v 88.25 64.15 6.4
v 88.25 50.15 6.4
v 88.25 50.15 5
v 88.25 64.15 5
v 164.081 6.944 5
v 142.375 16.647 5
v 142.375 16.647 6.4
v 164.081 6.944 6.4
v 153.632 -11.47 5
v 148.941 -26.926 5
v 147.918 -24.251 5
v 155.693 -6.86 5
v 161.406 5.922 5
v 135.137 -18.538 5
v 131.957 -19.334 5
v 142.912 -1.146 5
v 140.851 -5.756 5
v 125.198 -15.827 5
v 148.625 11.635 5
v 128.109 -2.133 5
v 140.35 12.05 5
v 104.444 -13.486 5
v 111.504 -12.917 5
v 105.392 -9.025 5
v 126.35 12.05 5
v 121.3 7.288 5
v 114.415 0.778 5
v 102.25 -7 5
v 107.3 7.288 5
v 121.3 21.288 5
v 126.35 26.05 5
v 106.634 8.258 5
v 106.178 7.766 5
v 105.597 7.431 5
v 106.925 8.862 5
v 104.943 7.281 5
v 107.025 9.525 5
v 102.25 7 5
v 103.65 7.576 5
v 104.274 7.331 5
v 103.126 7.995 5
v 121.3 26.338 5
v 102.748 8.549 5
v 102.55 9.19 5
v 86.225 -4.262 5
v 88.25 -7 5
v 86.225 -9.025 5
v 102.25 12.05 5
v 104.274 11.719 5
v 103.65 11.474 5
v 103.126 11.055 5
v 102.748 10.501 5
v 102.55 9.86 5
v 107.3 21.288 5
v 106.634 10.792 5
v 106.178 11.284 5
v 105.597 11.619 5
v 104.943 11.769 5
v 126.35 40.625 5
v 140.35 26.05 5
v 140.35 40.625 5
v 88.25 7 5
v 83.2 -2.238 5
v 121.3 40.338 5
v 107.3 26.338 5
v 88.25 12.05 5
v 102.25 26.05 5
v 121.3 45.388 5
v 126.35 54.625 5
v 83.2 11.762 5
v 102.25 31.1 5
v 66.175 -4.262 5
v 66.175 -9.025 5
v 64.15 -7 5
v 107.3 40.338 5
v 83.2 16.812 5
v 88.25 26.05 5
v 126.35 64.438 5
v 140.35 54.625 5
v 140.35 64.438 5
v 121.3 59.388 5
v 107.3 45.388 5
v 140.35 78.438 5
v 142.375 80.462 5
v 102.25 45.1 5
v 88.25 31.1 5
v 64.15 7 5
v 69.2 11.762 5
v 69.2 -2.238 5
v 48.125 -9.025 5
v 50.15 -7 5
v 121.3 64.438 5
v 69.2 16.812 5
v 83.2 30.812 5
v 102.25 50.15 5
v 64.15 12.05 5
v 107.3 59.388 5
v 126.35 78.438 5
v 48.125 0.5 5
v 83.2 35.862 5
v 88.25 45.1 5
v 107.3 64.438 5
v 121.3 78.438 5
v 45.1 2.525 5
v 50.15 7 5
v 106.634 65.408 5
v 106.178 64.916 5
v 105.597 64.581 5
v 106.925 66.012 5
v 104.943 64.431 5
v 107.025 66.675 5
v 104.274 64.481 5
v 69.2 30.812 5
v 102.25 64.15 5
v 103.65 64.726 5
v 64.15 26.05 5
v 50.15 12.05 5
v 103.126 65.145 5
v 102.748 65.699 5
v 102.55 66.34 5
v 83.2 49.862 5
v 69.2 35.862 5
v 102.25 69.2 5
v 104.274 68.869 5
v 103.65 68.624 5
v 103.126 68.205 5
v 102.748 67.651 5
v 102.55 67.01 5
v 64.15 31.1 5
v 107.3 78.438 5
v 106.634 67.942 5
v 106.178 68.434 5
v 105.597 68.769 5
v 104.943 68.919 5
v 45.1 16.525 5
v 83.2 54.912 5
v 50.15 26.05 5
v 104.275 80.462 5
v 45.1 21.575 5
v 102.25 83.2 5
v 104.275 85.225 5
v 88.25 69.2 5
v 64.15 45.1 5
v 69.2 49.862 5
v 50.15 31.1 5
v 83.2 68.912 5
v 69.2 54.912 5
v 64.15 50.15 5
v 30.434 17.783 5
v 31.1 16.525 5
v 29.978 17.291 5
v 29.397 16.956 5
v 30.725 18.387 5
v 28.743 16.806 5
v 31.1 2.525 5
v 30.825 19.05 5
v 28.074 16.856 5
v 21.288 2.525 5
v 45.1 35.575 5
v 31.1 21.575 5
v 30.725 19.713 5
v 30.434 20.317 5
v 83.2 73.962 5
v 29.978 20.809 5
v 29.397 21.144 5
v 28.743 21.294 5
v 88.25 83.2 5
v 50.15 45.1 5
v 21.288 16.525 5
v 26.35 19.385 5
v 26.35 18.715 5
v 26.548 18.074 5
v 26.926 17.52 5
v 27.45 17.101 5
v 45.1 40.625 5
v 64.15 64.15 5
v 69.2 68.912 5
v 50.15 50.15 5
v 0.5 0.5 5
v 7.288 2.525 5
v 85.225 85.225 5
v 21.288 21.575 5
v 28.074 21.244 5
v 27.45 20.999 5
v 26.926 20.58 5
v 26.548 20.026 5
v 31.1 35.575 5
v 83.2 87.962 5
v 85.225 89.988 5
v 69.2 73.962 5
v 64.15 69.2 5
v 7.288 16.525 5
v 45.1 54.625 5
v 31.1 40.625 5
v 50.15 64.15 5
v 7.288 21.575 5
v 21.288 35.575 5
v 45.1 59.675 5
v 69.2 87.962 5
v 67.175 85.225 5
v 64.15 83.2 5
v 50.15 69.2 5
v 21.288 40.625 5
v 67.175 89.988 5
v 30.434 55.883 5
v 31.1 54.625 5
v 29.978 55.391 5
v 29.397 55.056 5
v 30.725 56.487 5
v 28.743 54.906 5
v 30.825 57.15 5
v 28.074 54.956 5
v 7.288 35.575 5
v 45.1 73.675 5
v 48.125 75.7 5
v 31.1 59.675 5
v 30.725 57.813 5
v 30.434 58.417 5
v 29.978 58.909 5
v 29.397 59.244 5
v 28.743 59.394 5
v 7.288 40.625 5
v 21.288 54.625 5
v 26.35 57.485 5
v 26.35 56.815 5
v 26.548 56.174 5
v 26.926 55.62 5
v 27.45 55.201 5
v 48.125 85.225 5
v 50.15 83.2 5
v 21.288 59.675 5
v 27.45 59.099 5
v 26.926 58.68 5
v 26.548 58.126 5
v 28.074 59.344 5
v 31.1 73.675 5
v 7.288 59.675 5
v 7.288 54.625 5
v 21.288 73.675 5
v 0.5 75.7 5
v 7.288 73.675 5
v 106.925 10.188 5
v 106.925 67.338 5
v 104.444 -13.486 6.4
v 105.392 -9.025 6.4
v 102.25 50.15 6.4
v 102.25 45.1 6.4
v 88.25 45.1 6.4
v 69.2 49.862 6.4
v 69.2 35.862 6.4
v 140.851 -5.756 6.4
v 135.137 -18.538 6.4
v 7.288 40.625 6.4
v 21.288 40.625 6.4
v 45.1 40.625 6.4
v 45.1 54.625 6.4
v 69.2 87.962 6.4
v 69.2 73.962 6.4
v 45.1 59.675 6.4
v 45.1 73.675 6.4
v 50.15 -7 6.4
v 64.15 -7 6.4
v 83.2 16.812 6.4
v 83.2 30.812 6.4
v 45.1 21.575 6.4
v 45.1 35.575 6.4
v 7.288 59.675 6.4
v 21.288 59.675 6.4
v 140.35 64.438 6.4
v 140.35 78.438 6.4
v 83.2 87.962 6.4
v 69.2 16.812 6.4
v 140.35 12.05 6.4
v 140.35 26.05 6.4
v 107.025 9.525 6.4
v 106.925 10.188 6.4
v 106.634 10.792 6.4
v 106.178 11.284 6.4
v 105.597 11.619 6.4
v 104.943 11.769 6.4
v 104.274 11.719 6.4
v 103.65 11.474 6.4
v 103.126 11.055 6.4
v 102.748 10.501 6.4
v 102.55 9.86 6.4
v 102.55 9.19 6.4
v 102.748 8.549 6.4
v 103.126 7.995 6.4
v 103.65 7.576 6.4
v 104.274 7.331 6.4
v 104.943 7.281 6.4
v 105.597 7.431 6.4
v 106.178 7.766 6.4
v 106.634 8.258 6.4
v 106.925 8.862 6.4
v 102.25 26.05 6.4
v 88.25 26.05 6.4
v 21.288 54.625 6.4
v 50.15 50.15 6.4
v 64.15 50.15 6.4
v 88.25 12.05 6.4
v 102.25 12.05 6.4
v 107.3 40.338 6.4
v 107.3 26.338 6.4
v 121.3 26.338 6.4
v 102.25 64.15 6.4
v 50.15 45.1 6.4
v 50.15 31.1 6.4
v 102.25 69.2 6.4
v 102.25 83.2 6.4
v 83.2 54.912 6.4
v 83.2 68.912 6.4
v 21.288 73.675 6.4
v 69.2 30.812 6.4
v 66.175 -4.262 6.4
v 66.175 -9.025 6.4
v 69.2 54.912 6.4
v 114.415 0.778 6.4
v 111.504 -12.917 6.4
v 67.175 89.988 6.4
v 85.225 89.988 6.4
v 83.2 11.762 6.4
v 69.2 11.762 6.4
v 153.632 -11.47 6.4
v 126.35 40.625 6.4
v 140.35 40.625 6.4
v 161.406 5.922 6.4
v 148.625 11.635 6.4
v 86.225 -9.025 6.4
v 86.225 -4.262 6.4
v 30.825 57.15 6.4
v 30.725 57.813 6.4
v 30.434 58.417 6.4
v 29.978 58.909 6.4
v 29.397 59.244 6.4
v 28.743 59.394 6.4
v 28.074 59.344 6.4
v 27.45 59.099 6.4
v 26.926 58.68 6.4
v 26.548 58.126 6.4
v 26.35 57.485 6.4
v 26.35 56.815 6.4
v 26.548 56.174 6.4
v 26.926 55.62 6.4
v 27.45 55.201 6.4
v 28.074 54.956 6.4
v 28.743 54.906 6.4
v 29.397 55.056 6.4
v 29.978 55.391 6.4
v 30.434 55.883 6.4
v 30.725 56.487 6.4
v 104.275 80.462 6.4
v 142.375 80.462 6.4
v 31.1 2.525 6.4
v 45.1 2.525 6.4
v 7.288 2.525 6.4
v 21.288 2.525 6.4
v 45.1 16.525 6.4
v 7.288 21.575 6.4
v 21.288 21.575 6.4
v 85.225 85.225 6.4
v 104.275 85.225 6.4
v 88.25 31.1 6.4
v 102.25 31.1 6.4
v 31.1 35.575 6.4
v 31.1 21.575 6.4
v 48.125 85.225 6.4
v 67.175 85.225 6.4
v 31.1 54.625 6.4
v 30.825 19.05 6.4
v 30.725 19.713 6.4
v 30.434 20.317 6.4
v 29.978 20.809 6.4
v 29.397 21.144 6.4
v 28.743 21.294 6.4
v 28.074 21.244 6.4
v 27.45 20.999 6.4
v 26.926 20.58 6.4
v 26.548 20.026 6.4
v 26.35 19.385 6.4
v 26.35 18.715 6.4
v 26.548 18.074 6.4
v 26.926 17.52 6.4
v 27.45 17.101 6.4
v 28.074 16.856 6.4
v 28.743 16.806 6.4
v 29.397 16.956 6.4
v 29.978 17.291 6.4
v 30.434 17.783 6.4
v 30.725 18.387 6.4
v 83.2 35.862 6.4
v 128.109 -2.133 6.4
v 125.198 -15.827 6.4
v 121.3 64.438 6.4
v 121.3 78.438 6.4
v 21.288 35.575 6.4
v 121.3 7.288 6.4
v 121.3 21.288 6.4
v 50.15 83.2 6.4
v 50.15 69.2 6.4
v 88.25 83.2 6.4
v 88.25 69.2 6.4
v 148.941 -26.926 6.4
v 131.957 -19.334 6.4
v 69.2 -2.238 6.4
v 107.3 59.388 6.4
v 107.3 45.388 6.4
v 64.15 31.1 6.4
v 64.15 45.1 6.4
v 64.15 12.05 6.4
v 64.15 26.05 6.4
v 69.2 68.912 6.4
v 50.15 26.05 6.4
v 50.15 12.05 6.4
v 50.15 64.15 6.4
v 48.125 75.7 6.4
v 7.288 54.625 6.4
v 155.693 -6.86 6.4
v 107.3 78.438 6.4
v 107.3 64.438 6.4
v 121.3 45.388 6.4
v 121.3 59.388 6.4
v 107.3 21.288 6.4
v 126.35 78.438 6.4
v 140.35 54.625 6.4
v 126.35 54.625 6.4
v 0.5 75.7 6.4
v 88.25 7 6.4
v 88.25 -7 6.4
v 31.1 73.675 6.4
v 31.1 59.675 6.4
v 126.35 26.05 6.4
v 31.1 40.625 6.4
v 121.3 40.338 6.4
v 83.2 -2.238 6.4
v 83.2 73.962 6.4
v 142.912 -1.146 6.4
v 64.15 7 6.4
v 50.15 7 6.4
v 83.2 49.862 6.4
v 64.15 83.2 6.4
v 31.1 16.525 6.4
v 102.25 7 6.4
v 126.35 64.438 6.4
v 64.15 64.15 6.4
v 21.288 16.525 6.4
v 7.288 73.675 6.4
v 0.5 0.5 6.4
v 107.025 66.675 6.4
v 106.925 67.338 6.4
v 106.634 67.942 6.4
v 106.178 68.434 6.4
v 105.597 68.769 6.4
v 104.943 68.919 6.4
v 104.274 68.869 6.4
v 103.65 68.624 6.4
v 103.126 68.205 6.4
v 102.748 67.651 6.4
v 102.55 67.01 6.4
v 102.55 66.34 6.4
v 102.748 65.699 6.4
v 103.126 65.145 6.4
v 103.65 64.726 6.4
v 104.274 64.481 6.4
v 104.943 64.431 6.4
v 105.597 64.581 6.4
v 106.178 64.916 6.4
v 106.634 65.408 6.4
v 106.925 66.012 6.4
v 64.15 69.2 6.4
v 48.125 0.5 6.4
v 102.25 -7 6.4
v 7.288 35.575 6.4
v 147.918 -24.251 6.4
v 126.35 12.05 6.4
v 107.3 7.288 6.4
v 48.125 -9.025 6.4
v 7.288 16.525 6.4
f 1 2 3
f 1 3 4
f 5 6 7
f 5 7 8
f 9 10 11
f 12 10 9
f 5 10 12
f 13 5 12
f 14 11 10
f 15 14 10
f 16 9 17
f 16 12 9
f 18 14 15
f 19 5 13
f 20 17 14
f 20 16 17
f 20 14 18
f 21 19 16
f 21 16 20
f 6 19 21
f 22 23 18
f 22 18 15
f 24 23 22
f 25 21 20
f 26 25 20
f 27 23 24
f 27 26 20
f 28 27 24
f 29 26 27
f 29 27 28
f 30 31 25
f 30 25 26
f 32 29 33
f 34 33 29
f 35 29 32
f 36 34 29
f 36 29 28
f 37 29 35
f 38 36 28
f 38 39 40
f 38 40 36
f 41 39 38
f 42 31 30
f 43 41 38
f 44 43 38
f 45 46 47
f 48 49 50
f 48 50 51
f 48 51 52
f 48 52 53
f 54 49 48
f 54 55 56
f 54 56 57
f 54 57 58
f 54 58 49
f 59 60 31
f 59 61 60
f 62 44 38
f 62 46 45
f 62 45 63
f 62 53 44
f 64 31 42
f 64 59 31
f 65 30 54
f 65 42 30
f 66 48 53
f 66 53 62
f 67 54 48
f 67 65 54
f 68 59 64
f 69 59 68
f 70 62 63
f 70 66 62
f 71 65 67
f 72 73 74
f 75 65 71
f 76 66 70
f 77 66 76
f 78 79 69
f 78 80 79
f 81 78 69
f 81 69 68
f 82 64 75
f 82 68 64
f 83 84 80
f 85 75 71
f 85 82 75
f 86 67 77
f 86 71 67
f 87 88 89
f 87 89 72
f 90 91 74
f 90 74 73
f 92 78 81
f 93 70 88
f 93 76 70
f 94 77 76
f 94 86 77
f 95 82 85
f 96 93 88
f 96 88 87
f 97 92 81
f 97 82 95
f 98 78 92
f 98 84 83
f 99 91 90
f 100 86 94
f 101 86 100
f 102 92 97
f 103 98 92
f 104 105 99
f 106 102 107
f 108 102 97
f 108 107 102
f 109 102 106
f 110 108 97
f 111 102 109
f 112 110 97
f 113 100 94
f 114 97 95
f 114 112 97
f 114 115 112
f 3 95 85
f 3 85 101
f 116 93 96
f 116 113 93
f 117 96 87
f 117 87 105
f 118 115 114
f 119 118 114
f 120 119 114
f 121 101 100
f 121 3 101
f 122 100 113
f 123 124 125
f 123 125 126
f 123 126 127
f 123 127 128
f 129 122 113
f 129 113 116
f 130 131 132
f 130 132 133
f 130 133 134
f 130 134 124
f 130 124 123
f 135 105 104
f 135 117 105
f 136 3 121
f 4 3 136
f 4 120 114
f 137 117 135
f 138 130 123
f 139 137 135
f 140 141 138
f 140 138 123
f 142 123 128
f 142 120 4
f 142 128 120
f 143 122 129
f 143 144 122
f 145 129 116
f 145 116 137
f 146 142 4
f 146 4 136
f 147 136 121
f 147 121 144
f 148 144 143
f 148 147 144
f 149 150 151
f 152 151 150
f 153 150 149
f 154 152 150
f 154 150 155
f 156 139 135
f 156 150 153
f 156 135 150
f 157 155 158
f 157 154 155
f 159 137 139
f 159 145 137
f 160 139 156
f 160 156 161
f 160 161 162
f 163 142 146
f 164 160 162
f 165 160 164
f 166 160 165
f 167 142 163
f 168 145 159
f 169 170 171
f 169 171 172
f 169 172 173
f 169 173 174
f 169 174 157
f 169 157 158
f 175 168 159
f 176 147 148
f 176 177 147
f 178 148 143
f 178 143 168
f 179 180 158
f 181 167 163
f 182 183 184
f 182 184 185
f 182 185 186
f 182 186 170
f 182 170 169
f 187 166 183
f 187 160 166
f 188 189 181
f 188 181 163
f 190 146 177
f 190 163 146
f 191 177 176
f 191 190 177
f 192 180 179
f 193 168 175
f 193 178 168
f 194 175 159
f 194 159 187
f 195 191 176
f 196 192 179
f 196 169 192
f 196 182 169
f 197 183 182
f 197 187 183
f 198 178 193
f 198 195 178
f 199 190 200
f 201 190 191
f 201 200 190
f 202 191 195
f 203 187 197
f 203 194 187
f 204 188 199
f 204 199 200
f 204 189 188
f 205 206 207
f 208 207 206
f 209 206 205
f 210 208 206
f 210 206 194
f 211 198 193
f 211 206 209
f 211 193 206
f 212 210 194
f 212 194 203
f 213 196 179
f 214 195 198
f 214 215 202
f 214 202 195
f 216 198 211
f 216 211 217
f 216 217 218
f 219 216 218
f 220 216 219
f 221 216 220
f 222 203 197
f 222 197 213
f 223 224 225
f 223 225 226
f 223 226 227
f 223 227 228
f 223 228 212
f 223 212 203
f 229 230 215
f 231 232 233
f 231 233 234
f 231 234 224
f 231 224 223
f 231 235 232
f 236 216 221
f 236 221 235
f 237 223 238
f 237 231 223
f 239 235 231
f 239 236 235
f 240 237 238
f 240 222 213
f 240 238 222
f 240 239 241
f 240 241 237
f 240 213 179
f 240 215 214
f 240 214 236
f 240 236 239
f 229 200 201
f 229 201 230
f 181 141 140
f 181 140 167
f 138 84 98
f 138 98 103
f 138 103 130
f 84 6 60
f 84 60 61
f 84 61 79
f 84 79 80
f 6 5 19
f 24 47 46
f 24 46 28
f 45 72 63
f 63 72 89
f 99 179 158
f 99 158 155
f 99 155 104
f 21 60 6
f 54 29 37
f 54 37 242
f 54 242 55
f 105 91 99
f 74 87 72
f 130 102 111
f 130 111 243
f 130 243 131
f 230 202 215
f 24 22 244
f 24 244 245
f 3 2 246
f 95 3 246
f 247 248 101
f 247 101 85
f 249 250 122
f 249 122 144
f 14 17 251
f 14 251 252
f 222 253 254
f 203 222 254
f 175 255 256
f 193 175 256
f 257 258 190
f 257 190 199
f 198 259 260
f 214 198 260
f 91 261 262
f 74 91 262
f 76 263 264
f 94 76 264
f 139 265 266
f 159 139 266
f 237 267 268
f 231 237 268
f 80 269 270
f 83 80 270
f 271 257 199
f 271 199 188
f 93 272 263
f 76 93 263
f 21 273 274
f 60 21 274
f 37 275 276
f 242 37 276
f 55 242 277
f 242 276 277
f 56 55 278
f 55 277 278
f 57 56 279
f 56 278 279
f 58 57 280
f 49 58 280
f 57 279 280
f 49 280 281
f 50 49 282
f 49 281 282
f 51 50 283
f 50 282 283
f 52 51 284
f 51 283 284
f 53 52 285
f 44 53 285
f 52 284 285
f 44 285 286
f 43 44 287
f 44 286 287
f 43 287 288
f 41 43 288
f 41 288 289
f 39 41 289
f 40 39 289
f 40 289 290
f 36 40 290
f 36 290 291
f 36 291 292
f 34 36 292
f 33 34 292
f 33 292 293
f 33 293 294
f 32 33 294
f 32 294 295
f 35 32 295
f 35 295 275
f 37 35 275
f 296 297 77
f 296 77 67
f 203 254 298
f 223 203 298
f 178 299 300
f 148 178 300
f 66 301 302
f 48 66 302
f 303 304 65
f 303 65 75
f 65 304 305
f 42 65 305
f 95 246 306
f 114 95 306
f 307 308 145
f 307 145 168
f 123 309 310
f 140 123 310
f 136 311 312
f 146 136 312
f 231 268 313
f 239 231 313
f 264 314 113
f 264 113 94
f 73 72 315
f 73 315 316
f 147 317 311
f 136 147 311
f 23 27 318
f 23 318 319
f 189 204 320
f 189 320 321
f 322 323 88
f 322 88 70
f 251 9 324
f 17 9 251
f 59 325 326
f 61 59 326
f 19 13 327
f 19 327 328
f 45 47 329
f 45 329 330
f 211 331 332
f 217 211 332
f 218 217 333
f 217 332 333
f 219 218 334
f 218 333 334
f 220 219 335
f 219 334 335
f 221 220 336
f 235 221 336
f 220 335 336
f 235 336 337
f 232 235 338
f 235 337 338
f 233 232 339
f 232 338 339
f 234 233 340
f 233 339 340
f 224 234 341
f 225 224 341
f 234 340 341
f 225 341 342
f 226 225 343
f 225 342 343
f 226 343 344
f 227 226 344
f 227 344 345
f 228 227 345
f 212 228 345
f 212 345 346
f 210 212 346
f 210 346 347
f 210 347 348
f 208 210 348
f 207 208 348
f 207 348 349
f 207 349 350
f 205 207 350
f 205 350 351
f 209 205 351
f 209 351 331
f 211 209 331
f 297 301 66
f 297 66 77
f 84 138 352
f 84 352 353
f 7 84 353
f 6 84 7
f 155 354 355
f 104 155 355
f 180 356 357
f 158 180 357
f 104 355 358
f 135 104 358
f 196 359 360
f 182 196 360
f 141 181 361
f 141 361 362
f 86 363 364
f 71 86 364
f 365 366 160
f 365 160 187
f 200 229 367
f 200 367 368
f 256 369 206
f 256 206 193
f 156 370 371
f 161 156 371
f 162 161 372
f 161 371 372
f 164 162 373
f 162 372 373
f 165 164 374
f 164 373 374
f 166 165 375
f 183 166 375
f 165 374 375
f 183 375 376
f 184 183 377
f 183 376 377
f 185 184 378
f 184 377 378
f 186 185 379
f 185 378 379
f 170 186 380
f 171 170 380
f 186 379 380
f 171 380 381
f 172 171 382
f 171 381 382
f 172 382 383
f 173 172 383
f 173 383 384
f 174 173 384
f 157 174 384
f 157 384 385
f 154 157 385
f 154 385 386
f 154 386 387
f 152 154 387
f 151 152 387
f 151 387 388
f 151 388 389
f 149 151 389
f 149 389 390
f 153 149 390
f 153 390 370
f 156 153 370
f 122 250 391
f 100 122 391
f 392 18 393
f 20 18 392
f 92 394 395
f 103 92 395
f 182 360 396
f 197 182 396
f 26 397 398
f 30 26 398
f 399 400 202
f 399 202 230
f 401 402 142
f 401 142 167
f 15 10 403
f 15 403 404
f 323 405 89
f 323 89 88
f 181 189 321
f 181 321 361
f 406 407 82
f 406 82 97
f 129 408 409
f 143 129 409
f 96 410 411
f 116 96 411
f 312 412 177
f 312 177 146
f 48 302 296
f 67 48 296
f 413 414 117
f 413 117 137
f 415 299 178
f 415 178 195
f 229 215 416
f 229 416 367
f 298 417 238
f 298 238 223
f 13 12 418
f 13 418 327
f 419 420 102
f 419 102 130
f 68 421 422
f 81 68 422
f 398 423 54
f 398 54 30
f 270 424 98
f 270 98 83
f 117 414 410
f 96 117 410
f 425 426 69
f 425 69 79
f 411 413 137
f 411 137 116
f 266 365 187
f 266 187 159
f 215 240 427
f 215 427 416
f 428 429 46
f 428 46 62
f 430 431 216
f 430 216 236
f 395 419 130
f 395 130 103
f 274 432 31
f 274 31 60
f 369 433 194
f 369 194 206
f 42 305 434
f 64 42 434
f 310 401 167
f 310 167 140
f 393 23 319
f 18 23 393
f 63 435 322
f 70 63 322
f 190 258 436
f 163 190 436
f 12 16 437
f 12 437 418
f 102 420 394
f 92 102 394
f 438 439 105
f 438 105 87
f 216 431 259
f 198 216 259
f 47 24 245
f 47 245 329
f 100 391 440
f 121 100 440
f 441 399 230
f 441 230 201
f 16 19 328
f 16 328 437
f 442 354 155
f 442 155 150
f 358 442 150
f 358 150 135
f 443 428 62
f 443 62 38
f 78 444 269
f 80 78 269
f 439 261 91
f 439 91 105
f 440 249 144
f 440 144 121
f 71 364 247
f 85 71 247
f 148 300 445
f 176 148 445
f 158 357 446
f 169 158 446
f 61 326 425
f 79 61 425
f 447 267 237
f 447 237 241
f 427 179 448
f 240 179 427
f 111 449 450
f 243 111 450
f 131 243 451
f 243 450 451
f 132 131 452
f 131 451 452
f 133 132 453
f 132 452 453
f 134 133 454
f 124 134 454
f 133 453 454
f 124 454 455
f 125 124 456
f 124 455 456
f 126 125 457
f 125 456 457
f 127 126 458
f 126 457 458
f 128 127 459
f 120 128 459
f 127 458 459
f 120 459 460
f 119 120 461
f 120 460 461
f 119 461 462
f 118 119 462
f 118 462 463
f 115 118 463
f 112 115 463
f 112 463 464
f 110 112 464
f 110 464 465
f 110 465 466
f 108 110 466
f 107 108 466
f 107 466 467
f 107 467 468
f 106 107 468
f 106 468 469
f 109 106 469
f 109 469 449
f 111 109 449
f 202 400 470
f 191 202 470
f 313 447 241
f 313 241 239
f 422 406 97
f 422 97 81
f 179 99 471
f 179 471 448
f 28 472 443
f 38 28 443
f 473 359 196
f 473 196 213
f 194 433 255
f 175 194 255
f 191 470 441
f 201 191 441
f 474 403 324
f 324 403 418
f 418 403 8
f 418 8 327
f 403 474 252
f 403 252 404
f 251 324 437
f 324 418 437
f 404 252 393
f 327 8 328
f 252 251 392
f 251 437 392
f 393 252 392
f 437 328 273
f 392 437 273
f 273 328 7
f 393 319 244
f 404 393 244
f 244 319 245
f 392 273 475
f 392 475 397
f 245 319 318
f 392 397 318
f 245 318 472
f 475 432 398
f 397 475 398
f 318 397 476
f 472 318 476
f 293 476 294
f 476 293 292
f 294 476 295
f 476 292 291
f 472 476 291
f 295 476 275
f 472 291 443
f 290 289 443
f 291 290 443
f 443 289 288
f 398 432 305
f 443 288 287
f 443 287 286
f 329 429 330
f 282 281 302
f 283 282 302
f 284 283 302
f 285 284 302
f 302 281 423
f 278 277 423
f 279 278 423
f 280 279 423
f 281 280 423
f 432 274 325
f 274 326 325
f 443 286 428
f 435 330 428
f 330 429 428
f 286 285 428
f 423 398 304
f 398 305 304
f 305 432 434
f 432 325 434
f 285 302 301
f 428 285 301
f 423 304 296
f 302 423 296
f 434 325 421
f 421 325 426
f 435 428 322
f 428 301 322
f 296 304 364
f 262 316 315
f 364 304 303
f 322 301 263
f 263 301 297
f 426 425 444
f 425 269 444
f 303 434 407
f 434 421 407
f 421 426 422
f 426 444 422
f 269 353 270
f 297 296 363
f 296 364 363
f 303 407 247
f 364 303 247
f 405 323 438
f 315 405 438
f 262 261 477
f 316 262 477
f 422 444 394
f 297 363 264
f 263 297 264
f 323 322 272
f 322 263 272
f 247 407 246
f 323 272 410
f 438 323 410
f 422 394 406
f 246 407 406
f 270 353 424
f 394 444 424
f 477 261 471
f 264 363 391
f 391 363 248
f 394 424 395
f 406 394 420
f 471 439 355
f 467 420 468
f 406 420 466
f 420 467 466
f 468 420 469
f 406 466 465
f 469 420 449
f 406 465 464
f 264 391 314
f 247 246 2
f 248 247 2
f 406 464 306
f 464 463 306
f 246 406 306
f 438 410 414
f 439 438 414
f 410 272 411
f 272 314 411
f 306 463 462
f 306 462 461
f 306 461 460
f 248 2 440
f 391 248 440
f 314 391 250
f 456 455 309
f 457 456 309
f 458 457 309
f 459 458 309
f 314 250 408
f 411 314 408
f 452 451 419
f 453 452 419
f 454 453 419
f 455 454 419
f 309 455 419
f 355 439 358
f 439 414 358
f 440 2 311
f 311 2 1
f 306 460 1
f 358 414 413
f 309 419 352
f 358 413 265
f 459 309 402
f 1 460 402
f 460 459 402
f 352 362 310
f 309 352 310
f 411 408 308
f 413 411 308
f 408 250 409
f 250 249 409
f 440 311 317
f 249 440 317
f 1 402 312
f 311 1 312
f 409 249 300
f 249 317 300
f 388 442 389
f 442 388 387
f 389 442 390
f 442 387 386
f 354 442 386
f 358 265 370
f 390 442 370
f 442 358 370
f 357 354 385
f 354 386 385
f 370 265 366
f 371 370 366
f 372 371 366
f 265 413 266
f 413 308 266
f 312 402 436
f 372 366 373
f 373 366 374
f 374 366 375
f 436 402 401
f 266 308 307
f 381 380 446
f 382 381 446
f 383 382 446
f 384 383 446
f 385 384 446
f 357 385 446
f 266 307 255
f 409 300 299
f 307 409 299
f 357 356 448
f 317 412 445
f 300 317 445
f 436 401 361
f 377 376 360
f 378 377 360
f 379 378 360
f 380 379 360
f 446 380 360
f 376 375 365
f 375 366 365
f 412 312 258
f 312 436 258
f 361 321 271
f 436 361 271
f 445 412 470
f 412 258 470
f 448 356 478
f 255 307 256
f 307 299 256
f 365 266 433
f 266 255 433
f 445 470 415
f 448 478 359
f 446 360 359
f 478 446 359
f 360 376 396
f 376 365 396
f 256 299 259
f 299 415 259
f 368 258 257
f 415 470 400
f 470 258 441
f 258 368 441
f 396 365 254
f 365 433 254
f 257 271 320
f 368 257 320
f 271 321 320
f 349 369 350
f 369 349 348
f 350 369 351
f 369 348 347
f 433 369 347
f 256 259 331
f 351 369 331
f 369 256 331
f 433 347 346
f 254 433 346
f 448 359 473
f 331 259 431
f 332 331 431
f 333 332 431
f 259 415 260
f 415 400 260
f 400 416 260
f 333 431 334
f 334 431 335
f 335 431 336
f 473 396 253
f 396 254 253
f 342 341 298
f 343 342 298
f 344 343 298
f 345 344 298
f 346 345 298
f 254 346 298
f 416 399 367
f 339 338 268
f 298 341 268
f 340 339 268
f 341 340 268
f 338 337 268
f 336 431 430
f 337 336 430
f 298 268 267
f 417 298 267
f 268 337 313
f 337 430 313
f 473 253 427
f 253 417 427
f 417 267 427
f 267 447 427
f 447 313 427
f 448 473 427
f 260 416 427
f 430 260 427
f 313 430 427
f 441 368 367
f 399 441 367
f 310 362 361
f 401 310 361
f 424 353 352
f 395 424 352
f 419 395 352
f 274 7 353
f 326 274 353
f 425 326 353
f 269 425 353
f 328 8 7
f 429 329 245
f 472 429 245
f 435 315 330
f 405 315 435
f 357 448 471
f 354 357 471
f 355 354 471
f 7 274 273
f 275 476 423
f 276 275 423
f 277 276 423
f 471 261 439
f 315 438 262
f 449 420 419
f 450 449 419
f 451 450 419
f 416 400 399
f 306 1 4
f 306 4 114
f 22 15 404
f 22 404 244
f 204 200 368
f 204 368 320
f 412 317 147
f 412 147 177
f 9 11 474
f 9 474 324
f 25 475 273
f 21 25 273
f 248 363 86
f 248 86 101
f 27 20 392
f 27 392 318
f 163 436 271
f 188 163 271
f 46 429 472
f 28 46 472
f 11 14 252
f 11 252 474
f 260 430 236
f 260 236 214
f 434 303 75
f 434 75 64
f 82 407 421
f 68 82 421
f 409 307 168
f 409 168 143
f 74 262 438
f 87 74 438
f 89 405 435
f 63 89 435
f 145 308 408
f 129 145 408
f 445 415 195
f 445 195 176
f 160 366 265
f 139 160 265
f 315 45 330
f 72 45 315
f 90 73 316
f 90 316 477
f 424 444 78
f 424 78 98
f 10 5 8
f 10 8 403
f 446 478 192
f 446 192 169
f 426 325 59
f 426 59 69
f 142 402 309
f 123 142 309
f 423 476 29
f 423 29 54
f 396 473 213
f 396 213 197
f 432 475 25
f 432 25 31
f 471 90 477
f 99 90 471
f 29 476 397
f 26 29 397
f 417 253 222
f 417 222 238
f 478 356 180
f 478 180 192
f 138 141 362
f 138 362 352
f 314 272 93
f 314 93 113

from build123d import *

# Parameters (mm, degrees)
PAD001_DEPTH    = 1.4
SKETCH012_R     = 2.25
POCKET_DEPTH    = 5
SKETCH011_W     = 14
SKETCH011_H     = 14
POCKET005_DEPTH = 5


with BuildPart() as part:
    # Sketch002 → Pad001 (new body)
    with BuildSketch(Plane.XY):
        Polygon((0.5, 75.7), (48.125, 75.7), (48.125, 85.225), (67.175, 85.225), (67.175, 89.9875), (85.225, 89.9875), (85.225, 85.225), (104.275, 85.225), (104.275, 80.4625), (142.375, 80.4625), (142.375, 16.647033), (164.08137, 6.943809), (148.940768, -26.926121), (131.957481, -19.334219), (104.444214, -13.486094), (105.392449, -9.025), (86.225, -9.025), (86.225, -4.2625), (66.175, -4.2625), (66.175, -9.025), (48.125, -9.025), (48.125, 0.5), (0.5, 0.5), align=None)
        Polygon((111.504412, -12.916546), (125.198478, -15.827309), (128.109242, -2.133243), (114.415175, 0.777521), align=None, mode=Mode.SUBTRACT)
        Polygon((135.137374, -18.537583), (147.91848, -24.251018), (153.631915, -11.469912), (140.850809, -5.756478), align=None, mode=Mode.SUBTRACT)
        Polygon((142.911774, -1.146151), (155.69288, -6.859586), (161.406273, 5.921518), (148.625201, 11.634938), align=None, mode=Mode.SUBTRACT)
    extrude(amount=PAD001_DEPTH)

    # Sketch012 (on Face37 of Pad001) → Pocket (cut)
    with BuildSketch(Plane.XY.offset(1.4)):
        with Locations((28.575, 57.15)):
            Circle(SKETCH012_R)
        with Locations((28.575, 19.05)):
            Circle(SKETCH012_R)
        with Locations((104.775, 66.675)):
            Circle(SKETCH012_R)
        with Locations((104.775, 9.525)):
            Circle(SKETCH012_R)
    extrude(amount=-POCKET_DEPTH, mode=Mode.SUBTRACT)

    # Sketch011 (on Face37 of Pad001) → Pocket005 (cut)
    with BuildSketch(Plane.XY.offset(1.4)):
        with Locations((14.2875, 9.525)):
            Rectangle(SKETCH011_W, SKETCH011_H)
        with Locations((14.2875, 28.575)):
            Rectangle(SKETCH011_W, SKETCH011_H)
        with Locations((14.2875, 47.625)):
            Rectangle(SKETCH011_W, SKETCH011_H)
        with Locations((14.2875, 66.675)):
            Rectangle(SKETCH011_W, SKETCH011_H)
        with Locations((38.1, 9.525)):
            Rectangle(SKETCH011_W, SKETCH011_H)
        with Locations((38.1, 28.575)):
            Rectangle(SKETCH011_W, SKETCH011_H)
        with Locations((38.1, 47.625)):
            Rectangle(SKETCH011_W, SKETCH011_H)
        with Locations((38.1, 66.675)):
            Rectangle(SKETCH011_W, SKETCH011_H)
        with Locations((57.15, 0)):
            Rectangle(SKETCH011_W, SKETCH011_H)
        with Locations((57.15, 19.05)):
            Rectangle(SKETCH011_W, SKETCH011_H)
        with Locations((57.15, 38.1)):
            Rectangle(SKETCH011_W, SKETCH011_H)
        with Locations((57.15, 57.15)):
            Rectangle(SKETCH011_W, SKETCH011_H)
        with Locations((57.15, 76.2)):
            Rectangle(SKETCH011_W, SKETCH011_H)
        with Locations((76.2, 4.7625)):
            Rectangle(SKETCH011_W, SKETCH011_H)
        with Locations((76.2, 23.8125)):
            Rectangle(SKETCH011_W, SKETCH011_H)
        with Locations((76.2, 42.8625)):
            Rectangle(SKETCH011_W, SKETCH011_H)
        with Locations((76.2, 61.9125)):
            Rectangle(SKETCH011_W, SKETCH011_H)
        with Locations((76.2, 80.9625)):
            Rectangle(SKETCH011_W, SKETCH011_H)
        with Locations((95.25, 0)):
            Rectangle(SKETCH011_W, SKETCH011_H)
        with Locations((95.25, 19.05)):
            Rectangle(SKETCH011_W, SKETCH011_H)
        with Locations((95.25, 38.1)):
            Rectangle(SKETCH011_W, SKETCH011_H)
        with Locations((95.25, 57.15)):
            Rectangle(SKETCH011_W, SKETCH011_H)
        with Locations((95.25, 76.2)):
            Rectangle(SKETCH011_W, SKETCH011_H)
        with Locations((114.3, 14.2875)):
            Rectangle(SKETCH011_W, SKETCH011_H)
        with Locations((114.3, 33.3375)):
            Rectangle(SKETCH011_W, SKETCH011_H)
        with Locations((114.3, 52.3875)):
            Rectangle(SKETCH011_W, SKETCH011_H)
        with Locations((114.3, 71.4375)):
            Rectangle(SKETCH011_W, SKETCH011_H)
        with Locations((133.35, 19.05)):
            Rectangle(SKETCH011_W, SKETCH011_H)
        with Locations((133.35, 47.625)):
            Rectangle(SKETCH011_W, SKETCH011_H)
        with Locations((133.35, 71.4375)):
            Rectangle(SKETCH011_W, SKETCH011_H)
    extrude(amount=-POCKET005_DEPTH, mode=Mode.SUBTRACT)


with BuildPart() as part_1:
    # Body001 placement: moved
    add(part.part.moved(Location((0, 0, 5))))


solid = part_1.part
